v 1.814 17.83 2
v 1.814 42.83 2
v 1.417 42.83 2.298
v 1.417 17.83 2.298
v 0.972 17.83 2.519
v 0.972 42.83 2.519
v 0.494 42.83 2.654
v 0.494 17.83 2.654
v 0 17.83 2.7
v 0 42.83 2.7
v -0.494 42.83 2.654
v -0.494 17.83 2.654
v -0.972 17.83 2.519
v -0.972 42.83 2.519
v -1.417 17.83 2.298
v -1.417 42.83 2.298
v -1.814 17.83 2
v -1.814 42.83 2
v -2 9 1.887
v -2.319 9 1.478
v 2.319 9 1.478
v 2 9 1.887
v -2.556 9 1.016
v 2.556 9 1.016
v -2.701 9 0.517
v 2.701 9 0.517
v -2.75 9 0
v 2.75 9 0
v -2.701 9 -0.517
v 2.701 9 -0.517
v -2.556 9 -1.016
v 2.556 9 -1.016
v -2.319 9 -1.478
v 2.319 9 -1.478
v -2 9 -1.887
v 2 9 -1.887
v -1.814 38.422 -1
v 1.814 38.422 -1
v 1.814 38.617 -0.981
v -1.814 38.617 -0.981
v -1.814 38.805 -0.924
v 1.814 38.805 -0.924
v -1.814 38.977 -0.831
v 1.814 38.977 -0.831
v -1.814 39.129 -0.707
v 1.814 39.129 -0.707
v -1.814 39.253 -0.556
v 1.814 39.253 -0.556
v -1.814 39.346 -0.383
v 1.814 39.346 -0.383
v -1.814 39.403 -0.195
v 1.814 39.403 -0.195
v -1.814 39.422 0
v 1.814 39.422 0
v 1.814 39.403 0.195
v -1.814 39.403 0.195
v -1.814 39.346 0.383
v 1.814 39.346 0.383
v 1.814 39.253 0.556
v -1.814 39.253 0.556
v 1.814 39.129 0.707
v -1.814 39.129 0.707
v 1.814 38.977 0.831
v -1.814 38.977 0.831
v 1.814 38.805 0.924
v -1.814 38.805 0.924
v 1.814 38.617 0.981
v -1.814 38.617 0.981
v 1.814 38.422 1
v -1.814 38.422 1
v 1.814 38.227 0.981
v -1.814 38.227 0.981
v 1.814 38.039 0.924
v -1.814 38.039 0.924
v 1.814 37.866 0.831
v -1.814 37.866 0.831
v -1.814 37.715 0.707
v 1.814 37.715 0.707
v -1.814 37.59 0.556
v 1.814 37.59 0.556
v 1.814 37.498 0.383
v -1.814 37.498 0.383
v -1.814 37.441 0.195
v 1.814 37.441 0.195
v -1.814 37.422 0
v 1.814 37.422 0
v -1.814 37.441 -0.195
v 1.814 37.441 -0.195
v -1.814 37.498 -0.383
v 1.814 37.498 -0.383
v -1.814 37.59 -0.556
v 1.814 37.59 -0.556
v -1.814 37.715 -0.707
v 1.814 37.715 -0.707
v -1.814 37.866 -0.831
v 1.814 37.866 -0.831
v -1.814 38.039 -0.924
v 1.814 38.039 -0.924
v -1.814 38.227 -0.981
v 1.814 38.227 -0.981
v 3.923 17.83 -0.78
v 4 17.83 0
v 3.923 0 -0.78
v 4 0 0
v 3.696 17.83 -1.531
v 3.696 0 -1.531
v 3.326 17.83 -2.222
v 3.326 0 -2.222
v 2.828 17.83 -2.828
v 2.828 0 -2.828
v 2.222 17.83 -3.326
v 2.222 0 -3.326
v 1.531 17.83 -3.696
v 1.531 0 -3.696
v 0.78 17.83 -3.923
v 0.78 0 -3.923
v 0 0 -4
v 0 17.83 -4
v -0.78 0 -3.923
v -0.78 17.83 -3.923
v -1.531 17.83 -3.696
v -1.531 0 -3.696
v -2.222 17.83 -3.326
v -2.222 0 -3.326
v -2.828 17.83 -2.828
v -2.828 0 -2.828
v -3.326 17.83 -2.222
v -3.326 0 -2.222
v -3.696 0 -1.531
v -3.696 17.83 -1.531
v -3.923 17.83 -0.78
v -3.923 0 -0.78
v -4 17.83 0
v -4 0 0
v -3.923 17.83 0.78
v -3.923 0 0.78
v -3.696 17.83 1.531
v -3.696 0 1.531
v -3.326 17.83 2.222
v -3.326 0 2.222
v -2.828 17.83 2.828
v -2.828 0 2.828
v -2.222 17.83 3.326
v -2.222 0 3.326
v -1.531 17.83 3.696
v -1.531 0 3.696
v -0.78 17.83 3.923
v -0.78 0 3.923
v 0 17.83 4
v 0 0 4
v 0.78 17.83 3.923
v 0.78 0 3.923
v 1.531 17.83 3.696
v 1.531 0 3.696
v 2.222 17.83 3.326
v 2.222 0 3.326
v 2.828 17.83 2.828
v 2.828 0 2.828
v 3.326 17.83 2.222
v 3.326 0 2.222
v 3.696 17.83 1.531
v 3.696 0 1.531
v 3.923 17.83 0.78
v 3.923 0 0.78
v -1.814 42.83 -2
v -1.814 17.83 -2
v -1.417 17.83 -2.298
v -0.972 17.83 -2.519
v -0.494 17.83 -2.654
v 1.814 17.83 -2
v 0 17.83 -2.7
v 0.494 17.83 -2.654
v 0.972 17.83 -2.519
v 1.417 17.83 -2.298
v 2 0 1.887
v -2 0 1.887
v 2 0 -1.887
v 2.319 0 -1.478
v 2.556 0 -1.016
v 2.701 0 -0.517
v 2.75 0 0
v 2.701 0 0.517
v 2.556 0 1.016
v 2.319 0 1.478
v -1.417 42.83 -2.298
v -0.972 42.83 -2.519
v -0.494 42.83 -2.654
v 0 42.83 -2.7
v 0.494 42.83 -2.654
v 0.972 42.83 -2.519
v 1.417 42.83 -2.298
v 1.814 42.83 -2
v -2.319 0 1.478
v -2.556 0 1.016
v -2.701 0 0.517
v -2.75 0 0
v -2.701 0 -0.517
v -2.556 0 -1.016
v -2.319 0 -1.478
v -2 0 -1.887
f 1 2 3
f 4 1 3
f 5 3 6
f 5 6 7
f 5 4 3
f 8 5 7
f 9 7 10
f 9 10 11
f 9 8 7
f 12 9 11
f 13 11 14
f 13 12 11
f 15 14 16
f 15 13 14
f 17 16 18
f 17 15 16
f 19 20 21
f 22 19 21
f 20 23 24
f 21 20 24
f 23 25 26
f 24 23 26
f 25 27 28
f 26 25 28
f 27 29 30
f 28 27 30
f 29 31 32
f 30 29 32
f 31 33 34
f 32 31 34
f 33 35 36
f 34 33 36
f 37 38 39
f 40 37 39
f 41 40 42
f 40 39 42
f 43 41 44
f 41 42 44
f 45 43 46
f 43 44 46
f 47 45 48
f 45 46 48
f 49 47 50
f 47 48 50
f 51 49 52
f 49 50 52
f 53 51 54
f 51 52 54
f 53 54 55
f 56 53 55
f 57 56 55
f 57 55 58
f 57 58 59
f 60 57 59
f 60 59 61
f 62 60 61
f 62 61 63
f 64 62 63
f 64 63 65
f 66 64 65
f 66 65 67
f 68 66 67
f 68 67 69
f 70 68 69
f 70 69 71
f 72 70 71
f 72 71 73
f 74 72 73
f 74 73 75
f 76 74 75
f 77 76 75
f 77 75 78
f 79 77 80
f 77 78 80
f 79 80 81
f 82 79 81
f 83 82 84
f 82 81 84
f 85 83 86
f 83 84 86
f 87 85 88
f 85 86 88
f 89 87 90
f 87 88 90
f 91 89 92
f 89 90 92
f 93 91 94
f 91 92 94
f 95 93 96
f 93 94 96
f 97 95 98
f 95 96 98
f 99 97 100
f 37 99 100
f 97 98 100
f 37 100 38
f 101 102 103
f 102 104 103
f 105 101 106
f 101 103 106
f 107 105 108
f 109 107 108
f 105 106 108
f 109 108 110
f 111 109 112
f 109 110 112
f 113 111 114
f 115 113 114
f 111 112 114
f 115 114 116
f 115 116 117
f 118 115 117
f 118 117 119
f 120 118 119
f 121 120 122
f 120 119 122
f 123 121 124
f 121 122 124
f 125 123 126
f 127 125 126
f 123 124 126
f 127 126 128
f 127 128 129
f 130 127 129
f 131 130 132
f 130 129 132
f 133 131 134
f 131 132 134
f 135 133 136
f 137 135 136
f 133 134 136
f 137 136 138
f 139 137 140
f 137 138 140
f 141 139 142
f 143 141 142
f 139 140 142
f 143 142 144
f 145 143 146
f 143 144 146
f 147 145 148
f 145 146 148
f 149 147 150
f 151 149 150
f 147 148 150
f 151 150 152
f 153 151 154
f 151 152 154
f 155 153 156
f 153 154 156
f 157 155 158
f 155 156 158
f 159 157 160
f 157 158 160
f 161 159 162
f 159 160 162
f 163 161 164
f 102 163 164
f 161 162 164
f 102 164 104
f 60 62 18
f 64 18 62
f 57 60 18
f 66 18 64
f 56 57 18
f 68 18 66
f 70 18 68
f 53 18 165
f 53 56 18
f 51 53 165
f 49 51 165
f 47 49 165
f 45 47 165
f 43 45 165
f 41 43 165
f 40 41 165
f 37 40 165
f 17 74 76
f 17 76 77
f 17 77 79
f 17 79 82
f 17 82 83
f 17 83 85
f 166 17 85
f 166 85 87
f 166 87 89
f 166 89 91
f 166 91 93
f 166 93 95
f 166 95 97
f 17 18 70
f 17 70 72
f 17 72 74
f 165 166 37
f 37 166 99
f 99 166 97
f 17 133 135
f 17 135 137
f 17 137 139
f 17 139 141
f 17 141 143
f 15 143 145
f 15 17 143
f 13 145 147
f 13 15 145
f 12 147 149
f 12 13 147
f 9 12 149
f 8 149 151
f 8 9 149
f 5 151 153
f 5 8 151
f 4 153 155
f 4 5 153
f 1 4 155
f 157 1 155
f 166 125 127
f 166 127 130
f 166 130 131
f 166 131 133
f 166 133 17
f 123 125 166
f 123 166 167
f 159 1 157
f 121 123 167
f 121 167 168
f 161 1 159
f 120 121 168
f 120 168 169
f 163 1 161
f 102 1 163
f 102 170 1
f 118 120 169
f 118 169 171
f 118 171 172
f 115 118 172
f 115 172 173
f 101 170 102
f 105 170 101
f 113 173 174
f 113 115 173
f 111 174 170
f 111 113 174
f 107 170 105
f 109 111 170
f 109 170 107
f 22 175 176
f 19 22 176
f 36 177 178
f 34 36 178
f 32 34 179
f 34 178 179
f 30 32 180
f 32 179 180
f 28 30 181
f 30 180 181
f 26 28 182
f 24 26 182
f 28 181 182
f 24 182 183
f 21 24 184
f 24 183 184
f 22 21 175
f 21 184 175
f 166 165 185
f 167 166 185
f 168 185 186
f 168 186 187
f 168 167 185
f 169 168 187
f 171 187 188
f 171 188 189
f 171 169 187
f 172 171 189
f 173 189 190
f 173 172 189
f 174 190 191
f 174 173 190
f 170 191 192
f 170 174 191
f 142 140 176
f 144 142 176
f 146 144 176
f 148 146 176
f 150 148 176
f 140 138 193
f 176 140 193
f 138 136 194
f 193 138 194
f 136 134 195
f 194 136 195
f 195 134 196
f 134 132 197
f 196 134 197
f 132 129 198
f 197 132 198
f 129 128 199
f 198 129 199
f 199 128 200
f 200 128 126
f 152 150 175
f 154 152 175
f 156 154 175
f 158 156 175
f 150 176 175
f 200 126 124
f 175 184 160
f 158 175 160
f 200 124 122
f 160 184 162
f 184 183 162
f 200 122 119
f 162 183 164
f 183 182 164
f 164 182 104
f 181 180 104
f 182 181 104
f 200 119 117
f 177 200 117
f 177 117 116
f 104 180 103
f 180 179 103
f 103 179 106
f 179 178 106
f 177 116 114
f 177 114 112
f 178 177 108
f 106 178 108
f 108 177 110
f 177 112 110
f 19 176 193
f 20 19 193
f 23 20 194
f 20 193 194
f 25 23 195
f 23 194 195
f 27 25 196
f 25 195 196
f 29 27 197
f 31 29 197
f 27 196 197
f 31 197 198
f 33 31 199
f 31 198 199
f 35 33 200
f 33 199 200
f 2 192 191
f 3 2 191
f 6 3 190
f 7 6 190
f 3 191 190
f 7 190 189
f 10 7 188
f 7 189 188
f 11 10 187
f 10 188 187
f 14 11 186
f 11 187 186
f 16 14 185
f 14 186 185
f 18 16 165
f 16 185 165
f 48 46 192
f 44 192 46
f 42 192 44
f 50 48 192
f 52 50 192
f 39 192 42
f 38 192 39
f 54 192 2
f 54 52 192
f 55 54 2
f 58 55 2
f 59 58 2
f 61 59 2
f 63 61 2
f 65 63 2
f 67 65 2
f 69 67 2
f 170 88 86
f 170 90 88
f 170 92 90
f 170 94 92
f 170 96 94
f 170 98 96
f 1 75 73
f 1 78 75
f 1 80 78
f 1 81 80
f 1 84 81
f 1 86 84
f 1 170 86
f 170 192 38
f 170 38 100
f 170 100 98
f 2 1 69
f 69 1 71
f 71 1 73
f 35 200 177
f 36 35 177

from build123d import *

# Parameters (mm, degrees)
SKETCH1_R           = 4
BOSS_EXTRUDE1_DEPTH = 9
SKETCH2_R           = 4
BOSS_EXTRUDE2_DEPTH = 8.83
BOSS_EXTRUDE3_DEPTH = 25
SKETCH4_R           = 1
CUT_EXTRUDE1_DEPTH  = 25


with BuildPart() as part:
    # Sketch1 → Boss-Extrude1 (new body)
    with BuildSketch(Plane(origin=(0, 0, 0), x_dir=(1, 0, 0), z_dir=(0, 1, 0))):
        Circle(SKETCH1_R)
        with BuildLine():
            Line((-2, 1.887458609), (2, 1.887458609))
            ThreePointArc((2, 1.887458609), (2.75, 0), (2, -1.887458609))
            Line((2, -1.887458609), (-2, -1.887458609))
            ThreePointArc((-2, -1.887458609), (-2.75, 0), (-2, 1.887458609))
        make_face(mode=Mode.SUBTRACT)
    extrude(amount=BOSS_EXTRUDE1_DEPTH)

    # Sketch2 → Boss-Extrude2 (add)
    with BuildSketch(Plane(origin=(0, 9, 0), x_dir=(1, 0, 0), z_dir=(0, 1, 0))):
        Circle(SKETCH2_R)
    extrude(amount=BOSS_EXTRUDE2_DEPTH)

    # Sketch3 → Boss-Extrude3 (add)
    with BuildSketch(Plane(origin=(0, 17.83, 0), x_dir=(1, 0, 0), z_dir=(0, 1, 0))):
        with BuildLine():
            Line((1.813835715, 2), (1.813835715, -2))
            ThreePointArc((1.813835715, -2), (0, -2.7), (-1.813835715, -2))
            Line((-1.813835715, -2), (-1.813835715, 2))
            ThreePointArc((-1.813835715, 2), (0, 2.7), (1.813835715, 2))
        make_face()
    extrude(amount=BOSS_EXTRUDE3_DEPTH)

    # Sketch4 → Cut-Extrude1 (cut)
    with BuildSketch(Plane(origin=(1.813835715, 0, 0), x_dir=(0, 0, -1), z_dir=(1, 0, 0))):
        with Locations((0, 38.421822436)):
            Circle(SKETCH4_R)
    extrude(amount=-CUT_EXTRUDE1_DEPTH, mode=Mode.SUBTRACT)


solid = part.part
